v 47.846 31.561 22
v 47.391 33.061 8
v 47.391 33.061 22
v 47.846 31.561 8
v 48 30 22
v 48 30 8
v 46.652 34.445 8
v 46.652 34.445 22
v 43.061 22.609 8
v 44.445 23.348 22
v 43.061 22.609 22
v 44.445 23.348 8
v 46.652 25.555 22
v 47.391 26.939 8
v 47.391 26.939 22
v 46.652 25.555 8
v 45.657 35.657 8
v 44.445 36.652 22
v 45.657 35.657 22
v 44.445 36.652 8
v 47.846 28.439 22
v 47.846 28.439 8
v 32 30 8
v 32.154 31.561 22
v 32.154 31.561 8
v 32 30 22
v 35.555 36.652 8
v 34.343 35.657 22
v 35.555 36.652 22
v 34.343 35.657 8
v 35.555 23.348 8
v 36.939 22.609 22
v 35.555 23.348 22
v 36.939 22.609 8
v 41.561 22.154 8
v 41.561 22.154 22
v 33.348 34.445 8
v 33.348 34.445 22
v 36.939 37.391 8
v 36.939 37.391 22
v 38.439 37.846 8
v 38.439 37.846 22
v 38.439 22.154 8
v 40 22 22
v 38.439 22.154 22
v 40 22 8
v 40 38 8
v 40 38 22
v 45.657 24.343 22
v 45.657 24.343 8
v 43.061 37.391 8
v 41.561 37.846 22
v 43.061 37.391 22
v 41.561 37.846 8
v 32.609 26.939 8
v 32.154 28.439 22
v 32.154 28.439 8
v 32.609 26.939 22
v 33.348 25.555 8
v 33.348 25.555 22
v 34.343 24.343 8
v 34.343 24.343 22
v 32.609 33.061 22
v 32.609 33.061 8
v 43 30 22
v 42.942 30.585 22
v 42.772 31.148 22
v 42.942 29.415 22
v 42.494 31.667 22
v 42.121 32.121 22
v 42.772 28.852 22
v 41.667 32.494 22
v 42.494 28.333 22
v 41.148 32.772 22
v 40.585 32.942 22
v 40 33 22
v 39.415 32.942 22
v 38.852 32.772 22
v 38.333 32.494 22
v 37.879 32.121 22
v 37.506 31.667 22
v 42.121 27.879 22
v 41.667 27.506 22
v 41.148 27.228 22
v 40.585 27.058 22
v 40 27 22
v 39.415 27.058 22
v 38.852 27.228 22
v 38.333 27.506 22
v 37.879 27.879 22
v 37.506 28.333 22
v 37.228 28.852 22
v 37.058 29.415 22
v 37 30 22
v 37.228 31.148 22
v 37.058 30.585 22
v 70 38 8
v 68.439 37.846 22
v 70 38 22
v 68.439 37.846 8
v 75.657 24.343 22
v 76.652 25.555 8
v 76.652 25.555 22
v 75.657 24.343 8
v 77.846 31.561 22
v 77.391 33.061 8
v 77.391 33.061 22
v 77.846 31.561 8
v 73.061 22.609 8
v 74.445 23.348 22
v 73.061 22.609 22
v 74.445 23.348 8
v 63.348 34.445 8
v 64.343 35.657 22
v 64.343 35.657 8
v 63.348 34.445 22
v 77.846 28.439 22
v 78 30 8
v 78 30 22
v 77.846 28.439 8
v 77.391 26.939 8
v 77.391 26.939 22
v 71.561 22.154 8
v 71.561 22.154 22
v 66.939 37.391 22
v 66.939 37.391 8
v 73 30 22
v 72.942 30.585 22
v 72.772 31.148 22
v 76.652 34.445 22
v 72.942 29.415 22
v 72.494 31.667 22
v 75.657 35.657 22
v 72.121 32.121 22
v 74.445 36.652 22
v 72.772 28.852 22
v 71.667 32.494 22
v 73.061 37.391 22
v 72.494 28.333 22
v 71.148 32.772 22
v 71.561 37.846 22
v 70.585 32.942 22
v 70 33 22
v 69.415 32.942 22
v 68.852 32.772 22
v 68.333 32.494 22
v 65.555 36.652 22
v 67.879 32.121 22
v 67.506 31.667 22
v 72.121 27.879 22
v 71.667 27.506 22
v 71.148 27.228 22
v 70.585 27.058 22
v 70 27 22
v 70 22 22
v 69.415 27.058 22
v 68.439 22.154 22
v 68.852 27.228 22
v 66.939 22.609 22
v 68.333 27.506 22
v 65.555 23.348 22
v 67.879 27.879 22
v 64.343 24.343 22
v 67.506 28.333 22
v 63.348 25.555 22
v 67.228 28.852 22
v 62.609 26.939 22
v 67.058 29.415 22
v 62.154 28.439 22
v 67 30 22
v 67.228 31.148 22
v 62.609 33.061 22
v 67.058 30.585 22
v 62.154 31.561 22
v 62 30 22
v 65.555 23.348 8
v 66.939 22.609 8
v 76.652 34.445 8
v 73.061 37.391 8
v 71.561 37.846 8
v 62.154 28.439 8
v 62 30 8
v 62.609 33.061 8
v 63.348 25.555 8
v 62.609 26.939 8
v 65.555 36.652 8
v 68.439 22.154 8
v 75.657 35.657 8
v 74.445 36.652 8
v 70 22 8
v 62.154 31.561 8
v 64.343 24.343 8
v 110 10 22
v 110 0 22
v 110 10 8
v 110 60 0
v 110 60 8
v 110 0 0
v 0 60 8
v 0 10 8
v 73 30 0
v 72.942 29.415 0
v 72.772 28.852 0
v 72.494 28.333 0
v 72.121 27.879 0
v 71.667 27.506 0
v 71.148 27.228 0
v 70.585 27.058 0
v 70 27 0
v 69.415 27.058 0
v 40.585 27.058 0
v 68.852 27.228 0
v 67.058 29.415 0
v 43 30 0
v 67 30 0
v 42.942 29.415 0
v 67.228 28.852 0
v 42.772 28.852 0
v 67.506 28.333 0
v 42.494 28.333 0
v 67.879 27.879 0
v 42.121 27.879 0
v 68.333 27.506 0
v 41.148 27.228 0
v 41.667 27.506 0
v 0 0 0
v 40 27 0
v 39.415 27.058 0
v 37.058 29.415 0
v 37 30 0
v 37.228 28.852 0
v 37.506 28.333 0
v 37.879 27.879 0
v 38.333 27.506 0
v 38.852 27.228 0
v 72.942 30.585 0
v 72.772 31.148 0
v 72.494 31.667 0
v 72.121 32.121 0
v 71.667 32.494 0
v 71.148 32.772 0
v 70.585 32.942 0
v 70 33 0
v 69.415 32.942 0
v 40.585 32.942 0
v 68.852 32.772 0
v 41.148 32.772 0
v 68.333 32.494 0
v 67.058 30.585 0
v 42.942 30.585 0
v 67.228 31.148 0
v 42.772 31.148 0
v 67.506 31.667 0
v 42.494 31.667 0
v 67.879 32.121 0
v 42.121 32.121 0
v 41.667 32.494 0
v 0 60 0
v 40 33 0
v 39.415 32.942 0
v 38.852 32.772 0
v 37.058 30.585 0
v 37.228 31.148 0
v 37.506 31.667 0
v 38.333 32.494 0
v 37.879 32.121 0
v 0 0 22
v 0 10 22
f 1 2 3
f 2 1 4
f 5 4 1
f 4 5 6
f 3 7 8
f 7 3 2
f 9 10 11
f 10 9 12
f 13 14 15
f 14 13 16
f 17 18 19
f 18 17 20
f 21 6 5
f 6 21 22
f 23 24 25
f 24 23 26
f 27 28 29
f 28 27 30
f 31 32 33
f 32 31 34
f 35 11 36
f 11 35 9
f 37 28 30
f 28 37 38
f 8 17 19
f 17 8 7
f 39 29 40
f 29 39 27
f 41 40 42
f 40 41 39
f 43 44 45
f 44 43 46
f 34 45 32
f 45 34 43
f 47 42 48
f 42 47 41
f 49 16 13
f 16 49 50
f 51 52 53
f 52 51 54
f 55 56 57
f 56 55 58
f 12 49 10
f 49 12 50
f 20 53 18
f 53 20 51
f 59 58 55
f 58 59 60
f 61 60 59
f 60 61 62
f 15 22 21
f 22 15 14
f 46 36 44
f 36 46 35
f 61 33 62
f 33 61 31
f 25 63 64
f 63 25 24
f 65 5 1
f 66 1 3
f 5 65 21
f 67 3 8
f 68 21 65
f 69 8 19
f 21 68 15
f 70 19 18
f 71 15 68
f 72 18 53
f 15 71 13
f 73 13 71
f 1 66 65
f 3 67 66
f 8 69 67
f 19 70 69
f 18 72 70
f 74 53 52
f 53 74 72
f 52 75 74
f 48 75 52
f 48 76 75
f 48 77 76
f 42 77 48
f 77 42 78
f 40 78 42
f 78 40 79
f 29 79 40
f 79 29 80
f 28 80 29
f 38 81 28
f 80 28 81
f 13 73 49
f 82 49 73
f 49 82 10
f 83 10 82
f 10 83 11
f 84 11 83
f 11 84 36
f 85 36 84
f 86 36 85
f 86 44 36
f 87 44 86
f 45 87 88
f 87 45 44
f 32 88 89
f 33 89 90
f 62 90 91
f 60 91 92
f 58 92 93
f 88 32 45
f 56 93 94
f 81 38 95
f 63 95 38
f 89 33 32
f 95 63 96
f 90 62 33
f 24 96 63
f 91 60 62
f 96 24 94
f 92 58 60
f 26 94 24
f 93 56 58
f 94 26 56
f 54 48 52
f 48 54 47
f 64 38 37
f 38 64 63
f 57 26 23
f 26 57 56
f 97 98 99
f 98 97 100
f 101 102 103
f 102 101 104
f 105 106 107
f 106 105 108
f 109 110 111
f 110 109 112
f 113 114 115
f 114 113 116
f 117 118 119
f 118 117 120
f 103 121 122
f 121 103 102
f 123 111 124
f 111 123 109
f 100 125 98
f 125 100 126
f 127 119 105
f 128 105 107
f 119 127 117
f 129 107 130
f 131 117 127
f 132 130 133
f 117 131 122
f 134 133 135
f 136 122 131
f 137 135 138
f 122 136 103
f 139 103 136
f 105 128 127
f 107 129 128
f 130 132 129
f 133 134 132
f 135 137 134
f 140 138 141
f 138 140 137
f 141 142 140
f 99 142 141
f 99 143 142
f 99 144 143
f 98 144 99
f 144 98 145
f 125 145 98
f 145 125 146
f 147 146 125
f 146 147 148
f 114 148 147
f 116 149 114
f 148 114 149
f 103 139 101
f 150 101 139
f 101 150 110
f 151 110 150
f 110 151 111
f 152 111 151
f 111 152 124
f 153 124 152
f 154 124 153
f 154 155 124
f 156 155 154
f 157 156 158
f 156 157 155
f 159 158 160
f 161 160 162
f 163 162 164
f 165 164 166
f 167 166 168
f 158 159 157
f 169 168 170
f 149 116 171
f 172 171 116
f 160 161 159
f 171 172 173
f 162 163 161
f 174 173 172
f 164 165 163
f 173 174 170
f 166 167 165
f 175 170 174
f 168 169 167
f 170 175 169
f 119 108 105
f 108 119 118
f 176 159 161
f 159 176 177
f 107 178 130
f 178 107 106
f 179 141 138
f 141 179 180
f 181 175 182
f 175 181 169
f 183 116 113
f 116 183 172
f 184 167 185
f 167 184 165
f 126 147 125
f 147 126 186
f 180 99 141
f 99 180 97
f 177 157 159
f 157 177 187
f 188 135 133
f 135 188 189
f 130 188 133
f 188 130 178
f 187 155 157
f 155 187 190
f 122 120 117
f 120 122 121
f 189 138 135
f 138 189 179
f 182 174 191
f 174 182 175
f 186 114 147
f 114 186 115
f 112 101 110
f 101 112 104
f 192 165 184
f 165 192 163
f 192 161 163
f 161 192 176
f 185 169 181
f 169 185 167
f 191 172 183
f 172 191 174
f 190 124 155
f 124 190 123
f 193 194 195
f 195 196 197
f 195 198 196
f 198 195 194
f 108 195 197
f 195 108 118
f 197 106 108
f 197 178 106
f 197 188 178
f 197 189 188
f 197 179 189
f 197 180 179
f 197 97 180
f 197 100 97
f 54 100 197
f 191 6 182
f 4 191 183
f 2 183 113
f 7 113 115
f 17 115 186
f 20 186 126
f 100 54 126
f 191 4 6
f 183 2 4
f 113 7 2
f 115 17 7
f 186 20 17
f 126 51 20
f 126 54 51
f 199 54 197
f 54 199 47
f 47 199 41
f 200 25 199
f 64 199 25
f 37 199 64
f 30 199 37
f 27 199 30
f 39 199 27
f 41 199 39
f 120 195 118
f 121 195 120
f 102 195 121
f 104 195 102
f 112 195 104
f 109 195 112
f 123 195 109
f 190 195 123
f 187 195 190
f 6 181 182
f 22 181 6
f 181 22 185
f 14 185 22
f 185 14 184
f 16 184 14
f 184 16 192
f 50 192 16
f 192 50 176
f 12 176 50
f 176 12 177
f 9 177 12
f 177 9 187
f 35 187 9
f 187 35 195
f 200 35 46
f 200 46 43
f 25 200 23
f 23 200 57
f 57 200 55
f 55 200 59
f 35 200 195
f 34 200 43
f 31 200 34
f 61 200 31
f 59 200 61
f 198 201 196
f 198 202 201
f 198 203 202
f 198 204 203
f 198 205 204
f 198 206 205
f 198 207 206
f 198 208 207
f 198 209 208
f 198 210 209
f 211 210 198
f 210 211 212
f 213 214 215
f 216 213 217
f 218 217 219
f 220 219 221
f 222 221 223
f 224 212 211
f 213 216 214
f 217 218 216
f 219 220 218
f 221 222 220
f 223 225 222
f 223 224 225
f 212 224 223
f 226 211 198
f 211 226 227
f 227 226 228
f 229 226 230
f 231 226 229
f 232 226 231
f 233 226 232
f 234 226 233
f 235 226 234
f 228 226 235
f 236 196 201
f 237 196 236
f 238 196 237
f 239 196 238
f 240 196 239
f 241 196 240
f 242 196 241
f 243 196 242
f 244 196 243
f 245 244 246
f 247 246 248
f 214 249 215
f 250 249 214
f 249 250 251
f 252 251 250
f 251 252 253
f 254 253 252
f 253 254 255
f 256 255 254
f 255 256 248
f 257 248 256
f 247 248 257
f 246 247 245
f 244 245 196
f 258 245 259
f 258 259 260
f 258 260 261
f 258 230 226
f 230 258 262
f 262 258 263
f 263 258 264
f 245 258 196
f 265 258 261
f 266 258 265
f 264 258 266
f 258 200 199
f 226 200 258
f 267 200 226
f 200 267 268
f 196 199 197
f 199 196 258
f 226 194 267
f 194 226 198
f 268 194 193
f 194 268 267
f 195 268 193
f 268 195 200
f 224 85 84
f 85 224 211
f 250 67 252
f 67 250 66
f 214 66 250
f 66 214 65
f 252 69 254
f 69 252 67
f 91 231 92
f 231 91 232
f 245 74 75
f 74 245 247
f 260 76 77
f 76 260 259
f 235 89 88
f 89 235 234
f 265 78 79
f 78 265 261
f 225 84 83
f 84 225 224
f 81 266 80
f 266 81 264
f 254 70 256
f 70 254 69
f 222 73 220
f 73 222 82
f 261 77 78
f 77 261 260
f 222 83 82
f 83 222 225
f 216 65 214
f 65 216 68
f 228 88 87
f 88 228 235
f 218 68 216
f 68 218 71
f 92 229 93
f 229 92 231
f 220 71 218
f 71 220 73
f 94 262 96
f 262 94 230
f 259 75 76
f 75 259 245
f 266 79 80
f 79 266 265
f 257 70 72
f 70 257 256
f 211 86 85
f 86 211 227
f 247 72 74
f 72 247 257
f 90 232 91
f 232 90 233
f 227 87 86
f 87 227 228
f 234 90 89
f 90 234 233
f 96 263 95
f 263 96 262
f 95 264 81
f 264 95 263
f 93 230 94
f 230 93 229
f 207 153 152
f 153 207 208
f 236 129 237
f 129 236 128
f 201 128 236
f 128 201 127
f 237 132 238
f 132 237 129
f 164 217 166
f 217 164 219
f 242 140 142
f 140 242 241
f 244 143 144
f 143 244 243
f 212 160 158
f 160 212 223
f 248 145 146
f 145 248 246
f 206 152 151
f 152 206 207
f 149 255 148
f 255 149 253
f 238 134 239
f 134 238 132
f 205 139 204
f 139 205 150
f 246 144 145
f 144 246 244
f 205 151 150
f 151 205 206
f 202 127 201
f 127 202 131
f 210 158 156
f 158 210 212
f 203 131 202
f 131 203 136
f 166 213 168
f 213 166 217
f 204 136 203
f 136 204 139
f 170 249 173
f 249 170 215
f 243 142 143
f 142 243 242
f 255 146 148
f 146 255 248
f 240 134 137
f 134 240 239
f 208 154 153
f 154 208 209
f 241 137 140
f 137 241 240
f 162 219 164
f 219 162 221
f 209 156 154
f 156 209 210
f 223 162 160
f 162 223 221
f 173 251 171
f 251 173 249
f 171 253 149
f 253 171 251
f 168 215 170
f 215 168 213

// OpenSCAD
$fn = 32;

// ----------------------------------------------------------------------
// Drill jig: fence jig
// ----------------------------------------------------------------------

// --- parameters (mm) ---
plate_l = 110;            // plate length, X
plate_w = 60;             // plate width, Y
plate_t = 8;              // plate thickness
boss_d = 16;              // guide boss diameter
boss_h = 15;              // boss height above the plate
guide_d = 6;              // guide hole diameter
boss_pitch = 30;          // boss pitch
fence_h = 15;             // fence height above the plate
fence_t = 10;             // fence thickness

n_boss = 2;  // guide bosses
boss_x0 = (plate_l - (n_boss - 1) * boss_pitch) / 2;  // first boss X
boss_top = plate_t - 1 + boss_h;  // boss crown height
fence_top = plate_t - 1 + fence_h;  // fence crown height
total_h = max([fence_top, boss_top]);  // overall height

difference() {
  union() {
  cube([plate_l, plate_w, plate_t]);
  for (i = [0 : n_boss - 1])
    translate([boss_x0 + i * boss_pitch, plate_w / 2, plate_t - 1])
      cylinder(h = boss_h, d = boss_d);
  translate([0, 0, plate_t - 1]) cube([plate_l, fence_t, fence_h]);
  }
  for (i = [0 : n_boss - 1])
    translate([boss_x0 + i * boss_pitch, plate_w / 2, -1])
      cylinder(h = plate_t + boss_h, d = guide_d);
}
